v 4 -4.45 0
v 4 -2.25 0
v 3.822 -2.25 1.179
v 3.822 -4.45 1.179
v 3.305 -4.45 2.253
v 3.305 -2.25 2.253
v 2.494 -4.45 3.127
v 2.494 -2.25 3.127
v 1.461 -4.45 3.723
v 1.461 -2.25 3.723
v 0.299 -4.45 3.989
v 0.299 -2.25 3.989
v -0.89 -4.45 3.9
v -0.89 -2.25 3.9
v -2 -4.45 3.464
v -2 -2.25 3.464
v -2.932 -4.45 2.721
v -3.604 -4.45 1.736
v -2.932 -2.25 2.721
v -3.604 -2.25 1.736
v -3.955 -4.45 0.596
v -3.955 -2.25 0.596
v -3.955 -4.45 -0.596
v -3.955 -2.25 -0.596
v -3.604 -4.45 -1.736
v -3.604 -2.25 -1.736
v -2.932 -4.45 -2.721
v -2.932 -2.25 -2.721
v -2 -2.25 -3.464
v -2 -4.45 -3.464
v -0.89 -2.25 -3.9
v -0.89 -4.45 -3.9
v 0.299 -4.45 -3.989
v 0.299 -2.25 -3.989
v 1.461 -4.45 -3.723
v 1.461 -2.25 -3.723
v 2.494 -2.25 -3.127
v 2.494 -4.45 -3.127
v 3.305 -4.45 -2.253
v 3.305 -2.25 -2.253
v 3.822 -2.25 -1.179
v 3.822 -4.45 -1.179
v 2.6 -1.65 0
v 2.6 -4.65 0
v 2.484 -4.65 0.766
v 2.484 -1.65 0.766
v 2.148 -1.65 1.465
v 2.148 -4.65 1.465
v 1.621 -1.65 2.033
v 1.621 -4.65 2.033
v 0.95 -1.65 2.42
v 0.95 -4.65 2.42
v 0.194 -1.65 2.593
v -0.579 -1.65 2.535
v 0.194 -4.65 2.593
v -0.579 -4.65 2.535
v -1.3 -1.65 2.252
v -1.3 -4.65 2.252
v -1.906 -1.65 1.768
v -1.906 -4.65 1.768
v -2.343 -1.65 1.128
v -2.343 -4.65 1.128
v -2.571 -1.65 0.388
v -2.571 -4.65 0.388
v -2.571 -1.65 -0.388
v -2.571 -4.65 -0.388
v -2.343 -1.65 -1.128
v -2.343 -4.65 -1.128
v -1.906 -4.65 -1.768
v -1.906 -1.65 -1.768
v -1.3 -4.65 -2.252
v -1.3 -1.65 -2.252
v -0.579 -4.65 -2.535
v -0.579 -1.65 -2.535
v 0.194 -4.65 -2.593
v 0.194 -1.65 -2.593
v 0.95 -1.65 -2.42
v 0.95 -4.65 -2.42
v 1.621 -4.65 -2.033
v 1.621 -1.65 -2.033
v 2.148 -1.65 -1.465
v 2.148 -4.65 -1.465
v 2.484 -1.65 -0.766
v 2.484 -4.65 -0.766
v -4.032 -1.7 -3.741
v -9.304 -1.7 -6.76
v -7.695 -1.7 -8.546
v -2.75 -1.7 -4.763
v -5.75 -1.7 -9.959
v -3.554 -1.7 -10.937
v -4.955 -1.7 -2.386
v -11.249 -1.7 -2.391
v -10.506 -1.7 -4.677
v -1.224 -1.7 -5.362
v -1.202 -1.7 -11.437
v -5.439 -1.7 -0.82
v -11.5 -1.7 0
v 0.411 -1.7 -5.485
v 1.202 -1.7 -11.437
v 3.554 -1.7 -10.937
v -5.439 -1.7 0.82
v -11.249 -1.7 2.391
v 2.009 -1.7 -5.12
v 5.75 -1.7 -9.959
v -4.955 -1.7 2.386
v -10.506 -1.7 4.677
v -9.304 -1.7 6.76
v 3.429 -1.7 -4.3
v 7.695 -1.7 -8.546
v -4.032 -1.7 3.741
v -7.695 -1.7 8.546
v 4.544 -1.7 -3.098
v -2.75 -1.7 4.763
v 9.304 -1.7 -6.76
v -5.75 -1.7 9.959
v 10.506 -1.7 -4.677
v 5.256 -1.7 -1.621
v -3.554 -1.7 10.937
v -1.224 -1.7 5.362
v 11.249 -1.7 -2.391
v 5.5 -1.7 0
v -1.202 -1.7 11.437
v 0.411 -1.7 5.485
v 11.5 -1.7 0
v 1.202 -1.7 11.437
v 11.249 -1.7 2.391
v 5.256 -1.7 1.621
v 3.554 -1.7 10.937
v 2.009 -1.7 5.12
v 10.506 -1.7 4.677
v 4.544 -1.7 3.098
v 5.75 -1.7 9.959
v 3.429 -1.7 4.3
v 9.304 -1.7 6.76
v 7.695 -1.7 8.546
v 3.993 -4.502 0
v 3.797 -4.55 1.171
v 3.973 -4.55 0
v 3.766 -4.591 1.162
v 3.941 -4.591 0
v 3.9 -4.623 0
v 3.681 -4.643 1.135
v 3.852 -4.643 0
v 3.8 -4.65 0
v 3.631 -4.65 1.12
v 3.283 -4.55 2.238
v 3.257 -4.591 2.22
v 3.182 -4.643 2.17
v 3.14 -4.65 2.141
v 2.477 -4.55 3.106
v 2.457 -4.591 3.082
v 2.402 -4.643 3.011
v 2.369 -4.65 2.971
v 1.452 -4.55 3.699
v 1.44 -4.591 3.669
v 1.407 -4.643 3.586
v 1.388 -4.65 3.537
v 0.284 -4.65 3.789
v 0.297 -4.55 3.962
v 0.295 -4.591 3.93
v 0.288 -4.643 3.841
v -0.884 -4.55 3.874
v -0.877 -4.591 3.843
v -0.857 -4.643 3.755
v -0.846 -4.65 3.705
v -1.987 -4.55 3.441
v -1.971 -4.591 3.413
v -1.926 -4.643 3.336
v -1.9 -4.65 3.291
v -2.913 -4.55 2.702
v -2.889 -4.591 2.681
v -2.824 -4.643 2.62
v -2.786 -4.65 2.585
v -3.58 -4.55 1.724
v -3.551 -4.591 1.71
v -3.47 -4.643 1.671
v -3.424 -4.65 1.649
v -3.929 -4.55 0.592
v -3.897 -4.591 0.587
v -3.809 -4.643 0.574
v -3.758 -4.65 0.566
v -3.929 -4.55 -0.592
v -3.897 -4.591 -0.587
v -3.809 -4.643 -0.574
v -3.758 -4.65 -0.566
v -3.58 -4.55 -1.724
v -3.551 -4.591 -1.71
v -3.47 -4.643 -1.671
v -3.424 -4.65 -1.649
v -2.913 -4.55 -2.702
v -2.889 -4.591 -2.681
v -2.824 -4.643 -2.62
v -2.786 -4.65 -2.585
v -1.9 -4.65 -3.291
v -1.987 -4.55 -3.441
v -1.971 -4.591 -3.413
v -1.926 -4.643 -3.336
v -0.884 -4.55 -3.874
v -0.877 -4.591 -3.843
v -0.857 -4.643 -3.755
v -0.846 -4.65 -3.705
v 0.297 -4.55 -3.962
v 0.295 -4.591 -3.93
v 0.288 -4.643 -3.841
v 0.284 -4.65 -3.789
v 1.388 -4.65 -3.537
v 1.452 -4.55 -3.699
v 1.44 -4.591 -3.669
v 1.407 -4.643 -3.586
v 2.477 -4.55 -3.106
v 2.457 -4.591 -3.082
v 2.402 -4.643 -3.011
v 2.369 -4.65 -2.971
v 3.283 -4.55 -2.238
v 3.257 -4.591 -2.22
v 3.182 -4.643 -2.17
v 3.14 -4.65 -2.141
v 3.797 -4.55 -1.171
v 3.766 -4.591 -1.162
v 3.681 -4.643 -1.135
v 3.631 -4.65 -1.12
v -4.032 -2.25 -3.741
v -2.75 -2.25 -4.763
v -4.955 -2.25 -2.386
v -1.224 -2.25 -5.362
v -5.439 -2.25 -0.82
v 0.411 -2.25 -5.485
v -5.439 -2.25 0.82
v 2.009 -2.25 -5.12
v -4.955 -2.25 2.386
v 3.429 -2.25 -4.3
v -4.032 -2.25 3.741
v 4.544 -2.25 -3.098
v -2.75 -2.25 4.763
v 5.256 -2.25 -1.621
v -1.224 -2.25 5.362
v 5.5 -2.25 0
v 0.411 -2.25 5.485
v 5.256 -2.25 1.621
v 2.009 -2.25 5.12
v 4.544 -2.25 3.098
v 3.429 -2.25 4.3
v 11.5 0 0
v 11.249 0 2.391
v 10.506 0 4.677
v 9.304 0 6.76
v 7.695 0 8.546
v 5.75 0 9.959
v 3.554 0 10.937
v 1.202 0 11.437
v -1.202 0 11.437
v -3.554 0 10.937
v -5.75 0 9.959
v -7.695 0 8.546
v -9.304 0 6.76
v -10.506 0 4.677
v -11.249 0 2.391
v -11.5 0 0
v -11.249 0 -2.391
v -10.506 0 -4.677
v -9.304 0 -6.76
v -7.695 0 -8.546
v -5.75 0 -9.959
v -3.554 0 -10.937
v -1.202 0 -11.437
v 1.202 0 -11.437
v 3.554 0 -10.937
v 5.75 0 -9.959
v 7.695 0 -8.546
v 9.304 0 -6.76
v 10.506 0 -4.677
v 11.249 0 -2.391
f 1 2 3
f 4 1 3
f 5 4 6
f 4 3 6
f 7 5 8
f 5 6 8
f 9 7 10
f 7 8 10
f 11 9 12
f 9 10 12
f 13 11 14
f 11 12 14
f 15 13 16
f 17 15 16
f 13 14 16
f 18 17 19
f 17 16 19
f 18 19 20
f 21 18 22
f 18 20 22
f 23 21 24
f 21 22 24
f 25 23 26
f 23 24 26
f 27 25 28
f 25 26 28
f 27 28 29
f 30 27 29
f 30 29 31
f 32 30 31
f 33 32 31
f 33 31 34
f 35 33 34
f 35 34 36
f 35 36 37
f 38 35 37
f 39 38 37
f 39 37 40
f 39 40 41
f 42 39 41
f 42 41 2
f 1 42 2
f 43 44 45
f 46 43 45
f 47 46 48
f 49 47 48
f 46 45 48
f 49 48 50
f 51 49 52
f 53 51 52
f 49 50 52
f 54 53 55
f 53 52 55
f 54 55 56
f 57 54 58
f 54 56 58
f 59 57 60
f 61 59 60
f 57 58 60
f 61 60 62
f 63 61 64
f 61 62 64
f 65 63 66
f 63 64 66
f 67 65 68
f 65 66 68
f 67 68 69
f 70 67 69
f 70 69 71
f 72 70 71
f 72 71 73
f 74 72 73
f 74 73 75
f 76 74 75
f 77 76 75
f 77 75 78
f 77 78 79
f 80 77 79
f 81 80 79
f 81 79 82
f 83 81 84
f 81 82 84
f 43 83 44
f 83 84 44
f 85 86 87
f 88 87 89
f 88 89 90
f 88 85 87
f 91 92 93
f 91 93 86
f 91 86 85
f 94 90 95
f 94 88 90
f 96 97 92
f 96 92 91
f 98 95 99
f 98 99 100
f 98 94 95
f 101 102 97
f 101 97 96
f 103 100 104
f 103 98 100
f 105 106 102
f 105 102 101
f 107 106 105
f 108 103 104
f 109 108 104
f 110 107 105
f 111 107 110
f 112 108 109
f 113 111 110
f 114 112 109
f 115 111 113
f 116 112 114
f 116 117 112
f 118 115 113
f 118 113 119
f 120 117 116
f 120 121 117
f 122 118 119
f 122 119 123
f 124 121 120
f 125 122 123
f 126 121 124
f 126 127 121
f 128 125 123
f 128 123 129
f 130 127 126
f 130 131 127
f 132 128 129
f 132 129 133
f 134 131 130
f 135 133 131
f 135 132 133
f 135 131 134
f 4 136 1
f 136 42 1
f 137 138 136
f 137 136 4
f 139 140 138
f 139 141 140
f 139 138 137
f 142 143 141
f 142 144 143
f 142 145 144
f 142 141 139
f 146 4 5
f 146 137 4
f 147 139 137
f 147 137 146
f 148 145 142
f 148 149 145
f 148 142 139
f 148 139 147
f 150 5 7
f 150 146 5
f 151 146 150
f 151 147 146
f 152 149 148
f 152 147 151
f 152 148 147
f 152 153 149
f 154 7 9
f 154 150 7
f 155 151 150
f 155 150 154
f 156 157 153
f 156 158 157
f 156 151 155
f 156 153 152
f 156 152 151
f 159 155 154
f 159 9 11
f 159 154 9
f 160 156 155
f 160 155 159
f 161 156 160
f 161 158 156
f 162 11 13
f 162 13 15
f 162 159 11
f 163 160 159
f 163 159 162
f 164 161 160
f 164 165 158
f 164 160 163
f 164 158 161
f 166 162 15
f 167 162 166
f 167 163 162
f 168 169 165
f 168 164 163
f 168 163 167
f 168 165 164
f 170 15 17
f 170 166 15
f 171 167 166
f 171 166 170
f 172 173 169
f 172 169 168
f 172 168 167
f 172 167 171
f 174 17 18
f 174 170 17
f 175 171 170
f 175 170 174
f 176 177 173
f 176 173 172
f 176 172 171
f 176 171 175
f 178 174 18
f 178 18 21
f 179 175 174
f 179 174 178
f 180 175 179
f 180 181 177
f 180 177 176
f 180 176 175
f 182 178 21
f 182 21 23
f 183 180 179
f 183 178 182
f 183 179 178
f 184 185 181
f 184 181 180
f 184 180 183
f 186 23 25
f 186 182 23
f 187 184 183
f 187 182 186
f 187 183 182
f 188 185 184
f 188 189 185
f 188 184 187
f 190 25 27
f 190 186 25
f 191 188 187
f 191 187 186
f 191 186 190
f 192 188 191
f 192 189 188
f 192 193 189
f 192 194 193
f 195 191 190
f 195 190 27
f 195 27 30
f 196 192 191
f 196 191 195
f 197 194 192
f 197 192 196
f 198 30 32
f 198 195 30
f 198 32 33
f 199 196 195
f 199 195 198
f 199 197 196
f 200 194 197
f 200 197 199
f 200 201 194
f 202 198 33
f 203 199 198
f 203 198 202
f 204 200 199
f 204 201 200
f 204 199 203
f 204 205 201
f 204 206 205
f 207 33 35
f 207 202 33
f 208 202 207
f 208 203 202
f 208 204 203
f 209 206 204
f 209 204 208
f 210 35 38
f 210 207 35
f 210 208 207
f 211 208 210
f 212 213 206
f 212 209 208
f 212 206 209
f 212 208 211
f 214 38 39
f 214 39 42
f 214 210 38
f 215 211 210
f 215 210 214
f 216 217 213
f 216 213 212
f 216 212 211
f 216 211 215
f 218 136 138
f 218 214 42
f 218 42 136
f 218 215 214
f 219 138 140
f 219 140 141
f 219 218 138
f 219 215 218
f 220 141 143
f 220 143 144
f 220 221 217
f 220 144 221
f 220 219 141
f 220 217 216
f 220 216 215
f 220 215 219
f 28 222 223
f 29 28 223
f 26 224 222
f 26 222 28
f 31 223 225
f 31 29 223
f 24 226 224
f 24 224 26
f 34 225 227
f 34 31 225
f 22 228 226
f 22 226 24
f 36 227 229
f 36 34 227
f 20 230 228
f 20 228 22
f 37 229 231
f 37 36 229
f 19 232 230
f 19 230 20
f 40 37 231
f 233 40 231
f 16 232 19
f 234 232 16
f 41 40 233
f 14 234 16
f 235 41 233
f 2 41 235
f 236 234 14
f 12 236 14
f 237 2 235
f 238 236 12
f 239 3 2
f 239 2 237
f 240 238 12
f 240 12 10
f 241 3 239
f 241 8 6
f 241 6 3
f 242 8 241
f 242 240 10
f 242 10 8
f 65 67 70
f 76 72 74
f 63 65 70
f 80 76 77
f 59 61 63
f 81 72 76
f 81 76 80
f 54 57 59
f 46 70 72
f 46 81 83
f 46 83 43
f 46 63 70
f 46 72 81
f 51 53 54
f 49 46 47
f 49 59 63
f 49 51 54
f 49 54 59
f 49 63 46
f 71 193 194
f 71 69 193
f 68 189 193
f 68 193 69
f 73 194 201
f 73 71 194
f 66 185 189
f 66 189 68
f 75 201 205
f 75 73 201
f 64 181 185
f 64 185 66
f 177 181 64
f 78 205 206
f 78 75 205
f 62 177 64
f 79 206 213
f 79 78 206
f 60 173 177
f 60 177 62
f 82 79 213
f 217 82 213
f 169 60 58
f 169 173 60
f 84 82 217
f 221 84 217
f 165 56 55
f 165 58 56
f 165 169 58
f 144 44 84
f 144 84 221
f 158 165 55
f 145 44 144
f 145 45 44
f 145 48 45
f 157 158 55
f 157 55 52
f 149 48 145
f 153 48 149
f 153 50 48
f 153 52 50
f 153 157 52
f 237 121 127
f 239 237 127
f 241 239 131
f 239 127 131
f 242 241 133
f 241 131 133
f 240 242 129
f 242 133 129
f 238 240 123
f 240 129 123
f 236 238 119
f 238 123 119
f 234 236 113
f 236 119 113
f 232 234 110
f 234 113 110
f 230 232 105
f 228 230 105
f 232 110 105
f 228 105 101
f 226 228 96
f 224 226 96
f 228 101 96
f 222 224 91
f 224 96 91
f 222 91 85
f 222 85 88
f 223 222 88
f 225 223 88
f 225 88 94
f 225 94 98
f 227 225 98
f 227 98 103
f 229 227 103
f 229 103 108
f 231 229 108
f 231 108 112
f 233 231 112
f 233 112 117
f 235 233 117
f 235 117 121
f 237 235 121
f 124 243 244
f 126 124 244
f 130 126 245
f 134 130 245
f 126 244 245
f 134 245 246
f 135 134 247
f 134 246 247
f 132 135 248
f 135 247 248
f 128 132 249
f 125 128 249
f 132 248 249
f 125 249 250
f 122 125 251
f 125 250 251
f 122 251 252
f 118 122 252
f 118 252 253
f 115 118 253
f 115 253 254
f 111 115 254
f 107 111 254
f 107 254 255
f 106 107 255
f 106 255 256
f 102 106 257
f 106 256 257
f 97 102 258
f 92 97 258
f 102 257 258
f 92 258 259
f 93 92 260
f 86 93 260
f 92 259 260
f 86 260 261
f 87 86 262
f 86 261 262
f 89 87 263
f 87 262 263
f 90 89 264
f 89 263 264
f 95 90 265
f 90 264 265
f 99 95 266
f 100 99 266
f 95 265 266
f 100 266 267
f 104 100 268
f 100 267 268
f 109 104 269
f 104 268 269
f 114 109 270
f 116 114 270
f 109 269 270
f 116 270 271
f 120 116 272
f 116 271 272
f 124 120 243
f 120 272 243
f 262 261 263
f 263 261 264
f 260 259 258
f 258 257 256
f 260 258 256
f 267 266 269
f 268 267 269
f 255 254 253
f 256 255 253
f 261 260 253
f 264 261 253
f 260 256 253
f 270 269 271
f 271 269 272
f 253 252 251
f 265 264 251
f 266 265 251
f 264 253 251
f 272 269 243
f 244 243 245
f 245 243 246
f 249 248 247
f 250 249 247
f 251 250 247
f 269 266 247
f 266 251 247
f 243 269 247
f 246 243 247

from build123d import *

# Parameters (mm, degrees)
F0_R     = 11.5
F1_DEPTH = 1.7
F2_R     = 5.5
F3_DEPTH = 2.25
F4_R     = 4
F5_DEPTH = 4.65
F6_R     = 0.2
F7_R     = 2.6
F8_DEPTH = 3


with BuildPart() as f1:
    # F0 (on Front) → F1 (new body)
    with BuildSketch(Plane.XZ):
        Circle(F0_R)
    extrude(amount=F1_DEPTH)

    # F2 (on Front) → F3 (join)
    with BuildSketch(Plane.XZ):
        Circle(F2_R)
    extrude(amount=F3_DEPTH)

    # F4 (on Front) → F5 (join)
    with BuildSketch(Plane.XZ):
        Circle(F4_R)
    extrude(amount=F5_DEPTH)

    # F6
    f6_edges = [f1.edges().sort_by_distance(p)[0] for p in [
        (-4, -4.65, 0),
    ]]
    fillet(f6_edges, radius=F6_R)

    # F7 (on face) → F8 (cut)
    with BuildSketch(Plane.XZ.offset(4.65)):
        Circle(F7_R)
    extrude(amount=-F8_DEPTH, mode=Mode.SUBTRACT)


solid = f1.part
